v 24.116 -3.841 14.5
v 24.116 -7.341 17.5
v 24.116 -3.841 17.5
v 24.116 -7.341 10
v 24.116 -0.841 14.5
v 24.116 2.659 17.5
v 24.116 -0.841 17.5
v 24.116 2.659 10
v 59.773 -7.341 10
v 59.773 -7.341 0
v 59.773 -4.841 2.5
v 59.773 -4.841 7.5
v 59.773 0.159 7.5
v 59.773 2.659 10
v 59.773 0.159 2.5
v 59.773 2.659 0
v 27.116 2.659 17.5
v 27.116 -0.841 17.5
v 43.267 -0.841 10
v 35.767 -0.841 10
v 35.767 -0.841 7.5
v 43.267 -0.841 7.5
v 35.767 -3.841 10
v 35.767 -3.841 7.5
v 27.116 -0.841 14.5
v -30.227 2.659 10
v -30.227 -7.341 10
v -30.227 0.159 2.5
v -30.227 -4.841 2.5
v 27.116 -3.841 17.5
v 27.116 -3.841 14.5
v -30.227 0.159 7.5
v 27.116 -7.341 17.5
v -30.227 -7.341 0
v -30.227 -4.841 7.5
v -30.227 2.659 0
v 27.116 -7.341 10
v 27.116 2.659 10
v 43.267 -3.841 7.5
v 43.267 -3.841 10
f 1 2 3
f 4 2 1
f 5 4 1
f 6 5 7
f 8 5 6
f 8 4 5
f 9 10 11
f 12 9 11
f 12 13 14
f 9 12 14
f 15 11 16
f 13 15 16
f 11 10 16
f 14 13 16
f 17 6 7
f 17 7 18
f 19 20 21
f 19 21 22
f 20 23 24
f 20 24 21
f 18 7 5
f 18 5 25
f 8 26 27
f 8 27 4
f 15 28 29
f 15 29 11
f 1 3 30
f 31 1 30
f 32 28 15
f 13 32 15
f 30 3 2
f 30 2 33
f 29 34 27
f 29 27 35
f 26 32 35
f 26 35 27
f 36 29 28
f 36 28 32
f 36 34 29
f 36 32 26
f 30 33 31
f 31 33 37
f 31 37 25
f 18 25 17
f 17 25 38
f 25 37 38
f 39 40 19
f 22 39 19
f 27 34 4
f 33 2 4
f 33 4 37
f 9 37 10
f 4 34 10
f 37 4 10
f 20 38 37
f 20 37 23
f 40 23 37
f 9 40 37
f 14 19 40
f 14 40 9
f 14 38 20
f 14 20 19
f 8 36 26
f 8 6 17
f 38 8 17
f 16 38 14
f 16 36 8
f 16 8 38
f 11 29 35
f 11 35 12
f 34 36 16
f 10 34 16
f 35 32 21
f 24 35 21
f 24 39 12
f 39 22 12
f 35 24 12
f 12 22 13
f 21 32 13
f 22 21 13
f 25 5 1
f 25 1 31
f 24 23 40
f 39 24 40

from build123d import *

# Parameters (mm, degrees)
F0_W     = 90
F0_H     = 10
F1_DEPTH = 10
F2_T     = -2.5
F3_W     = 7.5
F3_H     = 3
F4_DEPTH = 2.5
F5_W     = 3
F5_H     = 10
F6_DEPTH = 7.5
F7_W     = 3
F7_H     = 3
F8_DEPTH = 3


with BuildPart() as f1:
    # F0 (on Top) → F1 (new body)
    with BuildSketch(Plane.XY):
        with Locations((14.77346, -2.340722)):
            Rectangle(F0_W, F0_H)
    extrude(amount=F1_DEPTH)

    # F2
    f2_openings = [f1.faces().sort_by_distance(p)[0] for p in [
        (59.77346, -2.340722, 5),
        (-30.22654, -2.340722, 5),
    ]]
    offset(amount=F2_T, openings=f2_openings)

    # F3 (on face) → F4 (cut, through all)
    with BuildSketch(Plane.XY.offset(10)):
        with Locations((39.516613, -2.340722)):
            Rectangle(F3_W, F3_H)
    extrude(amount=-F4_DEPTH, mode=Mode.SUBTRACT)

    # F5 (on face) → F6 (join)
    with BuildSketch(Plane.XY.offset(10)):
        with Locations((25.61603, -2.340722)):
            Rectangle(F5_W, F5_H)
    extrude(amount=F6_DEPTH)

    # F7 (on face) → F8 (cut)
    with BuildSketch(Plane.XY.offset(17.5)):
        with Locations((25.61603, -2.340722)):
            Rectangle(F7_W, F7_H)
    extrude(amount=-F8_DEPTH, mode=Mode.SUBTRACT)


solid = f1.part
